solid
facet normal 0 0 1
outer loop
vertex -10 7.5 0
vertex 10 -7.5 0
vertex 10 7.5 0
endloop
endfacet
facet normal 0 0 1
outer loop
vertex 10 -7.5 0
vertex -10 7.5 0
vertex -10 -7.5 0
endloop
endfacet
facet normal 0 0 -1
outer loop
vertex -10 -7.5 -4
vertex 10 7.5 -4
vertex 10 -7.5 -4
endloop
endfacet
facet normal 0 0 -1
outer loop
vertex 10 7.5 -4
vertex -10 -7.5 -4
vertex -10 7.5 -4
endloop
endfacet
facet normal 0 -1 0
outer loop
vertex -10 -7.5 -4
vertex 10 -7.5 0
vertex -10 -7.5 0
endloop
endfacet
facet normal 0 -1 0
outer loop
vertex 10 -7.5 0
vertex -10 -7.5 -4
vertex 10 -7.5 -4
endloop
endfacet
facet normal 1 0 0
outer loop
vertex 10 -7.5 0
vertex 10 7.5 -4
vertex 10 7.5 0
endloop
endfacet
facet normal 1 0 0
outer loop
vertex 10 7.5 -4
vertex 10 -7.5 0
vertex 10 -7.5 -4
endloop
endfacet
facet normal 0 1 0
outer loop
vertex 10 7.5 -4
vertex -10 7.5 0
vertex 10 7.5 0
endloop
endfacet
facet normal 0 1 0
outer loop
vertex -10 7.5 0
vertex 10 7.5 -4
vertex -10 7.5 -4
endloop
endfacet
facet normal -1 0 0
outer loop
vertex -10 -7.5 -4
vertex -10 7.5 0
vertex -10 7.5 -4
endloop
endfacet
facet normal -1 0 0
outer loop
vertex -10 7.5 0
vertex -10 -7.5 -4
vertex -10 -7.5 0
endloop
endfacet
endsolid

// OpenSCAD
// params
length=20;
width=15;
depth=4;
above_ground=false; 

// calculations
zdisplace = above_ground ? depth/2 : 0-(depth/2);

translate([0,0, zdisplace])  
  cube([length,width,depth], center=true);
